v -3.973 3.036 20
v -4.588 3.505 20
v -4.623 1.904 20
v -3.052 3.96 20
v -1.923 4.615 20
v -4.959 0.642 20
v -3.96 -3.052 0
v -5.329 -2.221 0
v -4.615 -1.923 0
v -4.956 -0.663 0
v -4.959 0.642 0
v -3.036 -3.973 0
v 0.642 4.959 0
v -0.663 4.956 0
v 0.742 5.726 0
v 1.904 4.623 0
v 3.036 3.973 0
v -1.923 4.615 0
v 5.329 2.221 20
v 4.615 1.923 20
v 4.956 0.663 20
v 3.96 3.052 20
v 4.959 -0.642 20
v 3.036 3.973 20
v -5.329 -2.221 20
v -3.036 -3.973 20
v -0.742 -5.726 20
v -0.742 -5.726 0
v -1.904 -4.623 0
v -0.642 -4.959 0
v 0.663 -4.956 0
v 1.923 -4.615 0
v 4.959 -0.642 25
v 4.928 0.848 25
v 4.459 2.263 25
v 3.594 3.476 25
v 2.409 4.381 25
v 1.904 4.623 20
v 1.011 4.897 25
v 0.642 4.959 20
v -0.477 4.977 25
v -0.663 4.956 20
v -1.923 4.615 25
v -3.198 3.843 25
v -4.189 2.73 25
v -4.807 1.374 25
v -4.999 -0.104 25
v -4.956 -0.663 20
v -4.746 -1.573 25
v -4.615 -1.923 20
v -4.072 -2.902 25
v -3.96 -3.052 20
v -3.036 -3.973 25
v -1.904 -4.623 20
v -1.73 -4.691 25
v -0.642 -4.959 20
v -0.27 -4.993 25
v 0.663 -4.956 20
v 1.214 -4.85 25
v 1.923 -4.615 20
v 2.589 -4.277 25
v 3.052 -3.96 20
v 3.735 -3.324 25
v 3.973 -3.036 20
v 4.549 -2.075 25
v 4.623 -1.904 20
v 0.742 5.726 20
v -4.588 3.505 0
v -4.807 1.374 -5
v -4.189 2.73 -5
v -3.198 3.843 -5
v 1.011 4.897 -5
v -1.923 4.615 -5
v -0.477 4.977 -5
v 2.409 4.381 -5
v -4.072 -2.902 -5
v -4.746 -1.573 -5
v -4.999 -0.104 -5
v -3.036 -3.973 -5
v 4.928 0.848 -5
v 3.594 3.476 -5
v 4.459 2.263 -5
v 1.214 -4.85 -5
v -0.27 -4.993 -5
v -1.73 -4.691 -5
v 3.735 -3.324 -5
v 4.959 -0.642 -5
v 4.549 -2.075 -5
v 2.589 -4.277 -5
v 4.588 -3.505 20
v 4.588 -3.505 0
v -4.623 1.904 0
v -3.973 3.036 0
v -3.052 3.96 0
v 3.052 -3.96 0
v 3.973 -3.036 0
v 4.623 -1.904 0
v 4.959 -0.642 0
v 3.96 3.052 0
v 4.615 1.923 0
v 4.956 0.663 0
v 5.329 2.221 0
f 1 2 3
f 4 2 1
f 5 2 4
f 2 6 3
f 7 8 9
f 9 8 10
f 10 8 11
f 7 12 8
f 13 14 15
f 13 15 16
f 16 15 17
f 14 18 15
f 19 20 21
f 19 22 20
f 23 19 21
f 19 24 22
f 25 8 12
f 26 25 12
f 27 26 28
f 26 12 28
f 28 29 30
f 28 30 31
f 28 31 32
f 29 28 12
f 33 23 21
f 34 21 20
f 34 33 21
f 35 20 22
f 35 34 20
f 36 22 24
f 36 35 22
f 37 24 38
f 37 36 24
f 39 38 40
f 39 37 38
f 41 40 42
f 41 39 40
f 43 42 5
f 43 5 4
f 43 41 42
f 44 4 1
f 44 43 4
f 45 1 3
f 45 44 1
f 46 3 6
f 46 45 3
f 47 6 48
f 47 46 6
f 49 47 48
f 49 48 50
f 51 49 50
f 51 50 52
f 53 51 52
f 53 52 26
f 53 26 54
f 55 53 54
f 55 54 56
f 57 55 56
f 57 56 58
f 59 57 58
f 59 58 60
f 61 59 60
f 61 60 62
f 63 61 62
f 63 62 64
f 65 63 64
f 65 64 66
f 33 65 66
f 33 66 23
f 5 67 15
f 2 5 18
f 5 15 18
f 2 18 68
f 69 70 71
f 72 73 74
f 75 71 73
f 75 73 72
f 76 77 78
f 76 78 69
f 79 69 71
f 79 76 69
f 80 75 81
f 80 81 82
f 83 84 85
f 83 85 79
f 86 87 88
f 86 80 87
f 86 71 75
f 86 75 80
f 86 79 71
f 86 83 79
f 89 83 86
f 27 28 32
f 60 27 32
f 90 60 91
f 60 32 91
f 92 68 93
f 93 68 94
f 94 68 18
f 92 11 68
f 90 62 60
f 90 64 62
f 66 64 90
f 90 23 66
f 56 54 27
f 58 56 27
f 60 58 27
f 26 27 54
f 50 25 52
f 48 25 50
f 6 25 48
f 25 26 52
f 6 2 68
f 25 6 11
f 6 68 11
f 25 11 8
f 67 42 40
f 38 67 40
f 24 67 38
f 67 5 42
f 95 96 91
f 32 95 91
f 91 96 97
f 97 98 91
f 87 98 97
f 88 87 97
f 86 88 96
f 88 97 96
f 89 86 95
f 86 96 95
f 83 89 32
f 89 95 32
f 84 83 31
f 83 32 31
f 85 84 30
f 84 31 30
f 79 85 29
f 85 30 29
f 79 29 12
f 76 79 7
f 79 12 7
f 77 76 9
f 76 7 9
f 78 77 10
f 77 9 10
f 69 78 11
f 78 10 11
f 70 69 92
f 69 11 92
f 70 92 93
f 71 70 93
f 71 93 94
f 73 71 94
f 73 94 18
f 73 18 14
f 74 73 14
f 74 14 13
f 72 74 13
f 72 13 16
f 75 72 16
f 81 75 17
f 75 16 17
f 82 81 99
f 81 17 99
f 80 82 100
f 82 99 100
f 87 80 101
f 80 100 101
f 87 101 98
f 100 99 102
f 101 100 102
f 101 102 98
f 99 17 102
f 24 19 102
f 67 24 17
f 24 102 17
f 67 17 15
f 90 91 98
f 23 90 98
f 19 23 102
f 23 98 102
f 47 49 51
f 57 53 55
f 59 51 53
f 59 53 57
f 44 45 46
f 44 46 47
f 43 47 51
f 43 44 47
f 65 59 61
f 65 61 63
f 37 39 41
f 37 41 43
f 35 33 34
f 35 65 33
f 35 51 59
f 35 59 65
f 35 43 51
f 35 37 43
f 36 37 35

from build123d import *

# Parameters (mm, degrees)
EXTRUDE_2_DEPTH = 20
SKETCH_2_R      = 5
EXTRUDE_3_DEPTH = 5
EXTRUDE_START   = 5
SKETCH_3_R      = 5
EXTRUDE_4_DEPTH = 5


with BuildPart() as part:
    # 草图1 → 凸台-拉伸2 (new body)
    with BuildSketch(Plane.XY):
        Polygon((5.3293871, 2.220577958), (0.741616627, 5.725673595), (-4.587770473, 3.505095636), (-5.3293871, -2.220577958), (-0.741616627, -5.725673595), (4.587770473, -3.505095636), align=None)
    extrude(amount=EXTRUDE_2_DEPTH)

    # 草图2 → 凸台-拉伸3 (add)
    with BuildSketch(Plane(origin=(0, 0, 0), x_dir=(-1, 0, 0), z_dir=(0, 0, -1))):
        with Locations(Location((0, 0, 0), (0, 0, 187.380135052))):
            Circle(SKETCH_2_R)
    extrude(amount=EXTRUDE_3_DEPTH)

    # 草图3 → 凸台-拉伸4 (add)
    with BuildSketch(Plane.XY.offset(20).offset(EXTRUDE_START)):
        with Locations(Location((0, 0, 0), (0, 0, 352.619864948))):
            Circle(SKETCH_3_R)
    extrude(amount=-EXTRUDE_4_DEPTH)


solid = part.part
